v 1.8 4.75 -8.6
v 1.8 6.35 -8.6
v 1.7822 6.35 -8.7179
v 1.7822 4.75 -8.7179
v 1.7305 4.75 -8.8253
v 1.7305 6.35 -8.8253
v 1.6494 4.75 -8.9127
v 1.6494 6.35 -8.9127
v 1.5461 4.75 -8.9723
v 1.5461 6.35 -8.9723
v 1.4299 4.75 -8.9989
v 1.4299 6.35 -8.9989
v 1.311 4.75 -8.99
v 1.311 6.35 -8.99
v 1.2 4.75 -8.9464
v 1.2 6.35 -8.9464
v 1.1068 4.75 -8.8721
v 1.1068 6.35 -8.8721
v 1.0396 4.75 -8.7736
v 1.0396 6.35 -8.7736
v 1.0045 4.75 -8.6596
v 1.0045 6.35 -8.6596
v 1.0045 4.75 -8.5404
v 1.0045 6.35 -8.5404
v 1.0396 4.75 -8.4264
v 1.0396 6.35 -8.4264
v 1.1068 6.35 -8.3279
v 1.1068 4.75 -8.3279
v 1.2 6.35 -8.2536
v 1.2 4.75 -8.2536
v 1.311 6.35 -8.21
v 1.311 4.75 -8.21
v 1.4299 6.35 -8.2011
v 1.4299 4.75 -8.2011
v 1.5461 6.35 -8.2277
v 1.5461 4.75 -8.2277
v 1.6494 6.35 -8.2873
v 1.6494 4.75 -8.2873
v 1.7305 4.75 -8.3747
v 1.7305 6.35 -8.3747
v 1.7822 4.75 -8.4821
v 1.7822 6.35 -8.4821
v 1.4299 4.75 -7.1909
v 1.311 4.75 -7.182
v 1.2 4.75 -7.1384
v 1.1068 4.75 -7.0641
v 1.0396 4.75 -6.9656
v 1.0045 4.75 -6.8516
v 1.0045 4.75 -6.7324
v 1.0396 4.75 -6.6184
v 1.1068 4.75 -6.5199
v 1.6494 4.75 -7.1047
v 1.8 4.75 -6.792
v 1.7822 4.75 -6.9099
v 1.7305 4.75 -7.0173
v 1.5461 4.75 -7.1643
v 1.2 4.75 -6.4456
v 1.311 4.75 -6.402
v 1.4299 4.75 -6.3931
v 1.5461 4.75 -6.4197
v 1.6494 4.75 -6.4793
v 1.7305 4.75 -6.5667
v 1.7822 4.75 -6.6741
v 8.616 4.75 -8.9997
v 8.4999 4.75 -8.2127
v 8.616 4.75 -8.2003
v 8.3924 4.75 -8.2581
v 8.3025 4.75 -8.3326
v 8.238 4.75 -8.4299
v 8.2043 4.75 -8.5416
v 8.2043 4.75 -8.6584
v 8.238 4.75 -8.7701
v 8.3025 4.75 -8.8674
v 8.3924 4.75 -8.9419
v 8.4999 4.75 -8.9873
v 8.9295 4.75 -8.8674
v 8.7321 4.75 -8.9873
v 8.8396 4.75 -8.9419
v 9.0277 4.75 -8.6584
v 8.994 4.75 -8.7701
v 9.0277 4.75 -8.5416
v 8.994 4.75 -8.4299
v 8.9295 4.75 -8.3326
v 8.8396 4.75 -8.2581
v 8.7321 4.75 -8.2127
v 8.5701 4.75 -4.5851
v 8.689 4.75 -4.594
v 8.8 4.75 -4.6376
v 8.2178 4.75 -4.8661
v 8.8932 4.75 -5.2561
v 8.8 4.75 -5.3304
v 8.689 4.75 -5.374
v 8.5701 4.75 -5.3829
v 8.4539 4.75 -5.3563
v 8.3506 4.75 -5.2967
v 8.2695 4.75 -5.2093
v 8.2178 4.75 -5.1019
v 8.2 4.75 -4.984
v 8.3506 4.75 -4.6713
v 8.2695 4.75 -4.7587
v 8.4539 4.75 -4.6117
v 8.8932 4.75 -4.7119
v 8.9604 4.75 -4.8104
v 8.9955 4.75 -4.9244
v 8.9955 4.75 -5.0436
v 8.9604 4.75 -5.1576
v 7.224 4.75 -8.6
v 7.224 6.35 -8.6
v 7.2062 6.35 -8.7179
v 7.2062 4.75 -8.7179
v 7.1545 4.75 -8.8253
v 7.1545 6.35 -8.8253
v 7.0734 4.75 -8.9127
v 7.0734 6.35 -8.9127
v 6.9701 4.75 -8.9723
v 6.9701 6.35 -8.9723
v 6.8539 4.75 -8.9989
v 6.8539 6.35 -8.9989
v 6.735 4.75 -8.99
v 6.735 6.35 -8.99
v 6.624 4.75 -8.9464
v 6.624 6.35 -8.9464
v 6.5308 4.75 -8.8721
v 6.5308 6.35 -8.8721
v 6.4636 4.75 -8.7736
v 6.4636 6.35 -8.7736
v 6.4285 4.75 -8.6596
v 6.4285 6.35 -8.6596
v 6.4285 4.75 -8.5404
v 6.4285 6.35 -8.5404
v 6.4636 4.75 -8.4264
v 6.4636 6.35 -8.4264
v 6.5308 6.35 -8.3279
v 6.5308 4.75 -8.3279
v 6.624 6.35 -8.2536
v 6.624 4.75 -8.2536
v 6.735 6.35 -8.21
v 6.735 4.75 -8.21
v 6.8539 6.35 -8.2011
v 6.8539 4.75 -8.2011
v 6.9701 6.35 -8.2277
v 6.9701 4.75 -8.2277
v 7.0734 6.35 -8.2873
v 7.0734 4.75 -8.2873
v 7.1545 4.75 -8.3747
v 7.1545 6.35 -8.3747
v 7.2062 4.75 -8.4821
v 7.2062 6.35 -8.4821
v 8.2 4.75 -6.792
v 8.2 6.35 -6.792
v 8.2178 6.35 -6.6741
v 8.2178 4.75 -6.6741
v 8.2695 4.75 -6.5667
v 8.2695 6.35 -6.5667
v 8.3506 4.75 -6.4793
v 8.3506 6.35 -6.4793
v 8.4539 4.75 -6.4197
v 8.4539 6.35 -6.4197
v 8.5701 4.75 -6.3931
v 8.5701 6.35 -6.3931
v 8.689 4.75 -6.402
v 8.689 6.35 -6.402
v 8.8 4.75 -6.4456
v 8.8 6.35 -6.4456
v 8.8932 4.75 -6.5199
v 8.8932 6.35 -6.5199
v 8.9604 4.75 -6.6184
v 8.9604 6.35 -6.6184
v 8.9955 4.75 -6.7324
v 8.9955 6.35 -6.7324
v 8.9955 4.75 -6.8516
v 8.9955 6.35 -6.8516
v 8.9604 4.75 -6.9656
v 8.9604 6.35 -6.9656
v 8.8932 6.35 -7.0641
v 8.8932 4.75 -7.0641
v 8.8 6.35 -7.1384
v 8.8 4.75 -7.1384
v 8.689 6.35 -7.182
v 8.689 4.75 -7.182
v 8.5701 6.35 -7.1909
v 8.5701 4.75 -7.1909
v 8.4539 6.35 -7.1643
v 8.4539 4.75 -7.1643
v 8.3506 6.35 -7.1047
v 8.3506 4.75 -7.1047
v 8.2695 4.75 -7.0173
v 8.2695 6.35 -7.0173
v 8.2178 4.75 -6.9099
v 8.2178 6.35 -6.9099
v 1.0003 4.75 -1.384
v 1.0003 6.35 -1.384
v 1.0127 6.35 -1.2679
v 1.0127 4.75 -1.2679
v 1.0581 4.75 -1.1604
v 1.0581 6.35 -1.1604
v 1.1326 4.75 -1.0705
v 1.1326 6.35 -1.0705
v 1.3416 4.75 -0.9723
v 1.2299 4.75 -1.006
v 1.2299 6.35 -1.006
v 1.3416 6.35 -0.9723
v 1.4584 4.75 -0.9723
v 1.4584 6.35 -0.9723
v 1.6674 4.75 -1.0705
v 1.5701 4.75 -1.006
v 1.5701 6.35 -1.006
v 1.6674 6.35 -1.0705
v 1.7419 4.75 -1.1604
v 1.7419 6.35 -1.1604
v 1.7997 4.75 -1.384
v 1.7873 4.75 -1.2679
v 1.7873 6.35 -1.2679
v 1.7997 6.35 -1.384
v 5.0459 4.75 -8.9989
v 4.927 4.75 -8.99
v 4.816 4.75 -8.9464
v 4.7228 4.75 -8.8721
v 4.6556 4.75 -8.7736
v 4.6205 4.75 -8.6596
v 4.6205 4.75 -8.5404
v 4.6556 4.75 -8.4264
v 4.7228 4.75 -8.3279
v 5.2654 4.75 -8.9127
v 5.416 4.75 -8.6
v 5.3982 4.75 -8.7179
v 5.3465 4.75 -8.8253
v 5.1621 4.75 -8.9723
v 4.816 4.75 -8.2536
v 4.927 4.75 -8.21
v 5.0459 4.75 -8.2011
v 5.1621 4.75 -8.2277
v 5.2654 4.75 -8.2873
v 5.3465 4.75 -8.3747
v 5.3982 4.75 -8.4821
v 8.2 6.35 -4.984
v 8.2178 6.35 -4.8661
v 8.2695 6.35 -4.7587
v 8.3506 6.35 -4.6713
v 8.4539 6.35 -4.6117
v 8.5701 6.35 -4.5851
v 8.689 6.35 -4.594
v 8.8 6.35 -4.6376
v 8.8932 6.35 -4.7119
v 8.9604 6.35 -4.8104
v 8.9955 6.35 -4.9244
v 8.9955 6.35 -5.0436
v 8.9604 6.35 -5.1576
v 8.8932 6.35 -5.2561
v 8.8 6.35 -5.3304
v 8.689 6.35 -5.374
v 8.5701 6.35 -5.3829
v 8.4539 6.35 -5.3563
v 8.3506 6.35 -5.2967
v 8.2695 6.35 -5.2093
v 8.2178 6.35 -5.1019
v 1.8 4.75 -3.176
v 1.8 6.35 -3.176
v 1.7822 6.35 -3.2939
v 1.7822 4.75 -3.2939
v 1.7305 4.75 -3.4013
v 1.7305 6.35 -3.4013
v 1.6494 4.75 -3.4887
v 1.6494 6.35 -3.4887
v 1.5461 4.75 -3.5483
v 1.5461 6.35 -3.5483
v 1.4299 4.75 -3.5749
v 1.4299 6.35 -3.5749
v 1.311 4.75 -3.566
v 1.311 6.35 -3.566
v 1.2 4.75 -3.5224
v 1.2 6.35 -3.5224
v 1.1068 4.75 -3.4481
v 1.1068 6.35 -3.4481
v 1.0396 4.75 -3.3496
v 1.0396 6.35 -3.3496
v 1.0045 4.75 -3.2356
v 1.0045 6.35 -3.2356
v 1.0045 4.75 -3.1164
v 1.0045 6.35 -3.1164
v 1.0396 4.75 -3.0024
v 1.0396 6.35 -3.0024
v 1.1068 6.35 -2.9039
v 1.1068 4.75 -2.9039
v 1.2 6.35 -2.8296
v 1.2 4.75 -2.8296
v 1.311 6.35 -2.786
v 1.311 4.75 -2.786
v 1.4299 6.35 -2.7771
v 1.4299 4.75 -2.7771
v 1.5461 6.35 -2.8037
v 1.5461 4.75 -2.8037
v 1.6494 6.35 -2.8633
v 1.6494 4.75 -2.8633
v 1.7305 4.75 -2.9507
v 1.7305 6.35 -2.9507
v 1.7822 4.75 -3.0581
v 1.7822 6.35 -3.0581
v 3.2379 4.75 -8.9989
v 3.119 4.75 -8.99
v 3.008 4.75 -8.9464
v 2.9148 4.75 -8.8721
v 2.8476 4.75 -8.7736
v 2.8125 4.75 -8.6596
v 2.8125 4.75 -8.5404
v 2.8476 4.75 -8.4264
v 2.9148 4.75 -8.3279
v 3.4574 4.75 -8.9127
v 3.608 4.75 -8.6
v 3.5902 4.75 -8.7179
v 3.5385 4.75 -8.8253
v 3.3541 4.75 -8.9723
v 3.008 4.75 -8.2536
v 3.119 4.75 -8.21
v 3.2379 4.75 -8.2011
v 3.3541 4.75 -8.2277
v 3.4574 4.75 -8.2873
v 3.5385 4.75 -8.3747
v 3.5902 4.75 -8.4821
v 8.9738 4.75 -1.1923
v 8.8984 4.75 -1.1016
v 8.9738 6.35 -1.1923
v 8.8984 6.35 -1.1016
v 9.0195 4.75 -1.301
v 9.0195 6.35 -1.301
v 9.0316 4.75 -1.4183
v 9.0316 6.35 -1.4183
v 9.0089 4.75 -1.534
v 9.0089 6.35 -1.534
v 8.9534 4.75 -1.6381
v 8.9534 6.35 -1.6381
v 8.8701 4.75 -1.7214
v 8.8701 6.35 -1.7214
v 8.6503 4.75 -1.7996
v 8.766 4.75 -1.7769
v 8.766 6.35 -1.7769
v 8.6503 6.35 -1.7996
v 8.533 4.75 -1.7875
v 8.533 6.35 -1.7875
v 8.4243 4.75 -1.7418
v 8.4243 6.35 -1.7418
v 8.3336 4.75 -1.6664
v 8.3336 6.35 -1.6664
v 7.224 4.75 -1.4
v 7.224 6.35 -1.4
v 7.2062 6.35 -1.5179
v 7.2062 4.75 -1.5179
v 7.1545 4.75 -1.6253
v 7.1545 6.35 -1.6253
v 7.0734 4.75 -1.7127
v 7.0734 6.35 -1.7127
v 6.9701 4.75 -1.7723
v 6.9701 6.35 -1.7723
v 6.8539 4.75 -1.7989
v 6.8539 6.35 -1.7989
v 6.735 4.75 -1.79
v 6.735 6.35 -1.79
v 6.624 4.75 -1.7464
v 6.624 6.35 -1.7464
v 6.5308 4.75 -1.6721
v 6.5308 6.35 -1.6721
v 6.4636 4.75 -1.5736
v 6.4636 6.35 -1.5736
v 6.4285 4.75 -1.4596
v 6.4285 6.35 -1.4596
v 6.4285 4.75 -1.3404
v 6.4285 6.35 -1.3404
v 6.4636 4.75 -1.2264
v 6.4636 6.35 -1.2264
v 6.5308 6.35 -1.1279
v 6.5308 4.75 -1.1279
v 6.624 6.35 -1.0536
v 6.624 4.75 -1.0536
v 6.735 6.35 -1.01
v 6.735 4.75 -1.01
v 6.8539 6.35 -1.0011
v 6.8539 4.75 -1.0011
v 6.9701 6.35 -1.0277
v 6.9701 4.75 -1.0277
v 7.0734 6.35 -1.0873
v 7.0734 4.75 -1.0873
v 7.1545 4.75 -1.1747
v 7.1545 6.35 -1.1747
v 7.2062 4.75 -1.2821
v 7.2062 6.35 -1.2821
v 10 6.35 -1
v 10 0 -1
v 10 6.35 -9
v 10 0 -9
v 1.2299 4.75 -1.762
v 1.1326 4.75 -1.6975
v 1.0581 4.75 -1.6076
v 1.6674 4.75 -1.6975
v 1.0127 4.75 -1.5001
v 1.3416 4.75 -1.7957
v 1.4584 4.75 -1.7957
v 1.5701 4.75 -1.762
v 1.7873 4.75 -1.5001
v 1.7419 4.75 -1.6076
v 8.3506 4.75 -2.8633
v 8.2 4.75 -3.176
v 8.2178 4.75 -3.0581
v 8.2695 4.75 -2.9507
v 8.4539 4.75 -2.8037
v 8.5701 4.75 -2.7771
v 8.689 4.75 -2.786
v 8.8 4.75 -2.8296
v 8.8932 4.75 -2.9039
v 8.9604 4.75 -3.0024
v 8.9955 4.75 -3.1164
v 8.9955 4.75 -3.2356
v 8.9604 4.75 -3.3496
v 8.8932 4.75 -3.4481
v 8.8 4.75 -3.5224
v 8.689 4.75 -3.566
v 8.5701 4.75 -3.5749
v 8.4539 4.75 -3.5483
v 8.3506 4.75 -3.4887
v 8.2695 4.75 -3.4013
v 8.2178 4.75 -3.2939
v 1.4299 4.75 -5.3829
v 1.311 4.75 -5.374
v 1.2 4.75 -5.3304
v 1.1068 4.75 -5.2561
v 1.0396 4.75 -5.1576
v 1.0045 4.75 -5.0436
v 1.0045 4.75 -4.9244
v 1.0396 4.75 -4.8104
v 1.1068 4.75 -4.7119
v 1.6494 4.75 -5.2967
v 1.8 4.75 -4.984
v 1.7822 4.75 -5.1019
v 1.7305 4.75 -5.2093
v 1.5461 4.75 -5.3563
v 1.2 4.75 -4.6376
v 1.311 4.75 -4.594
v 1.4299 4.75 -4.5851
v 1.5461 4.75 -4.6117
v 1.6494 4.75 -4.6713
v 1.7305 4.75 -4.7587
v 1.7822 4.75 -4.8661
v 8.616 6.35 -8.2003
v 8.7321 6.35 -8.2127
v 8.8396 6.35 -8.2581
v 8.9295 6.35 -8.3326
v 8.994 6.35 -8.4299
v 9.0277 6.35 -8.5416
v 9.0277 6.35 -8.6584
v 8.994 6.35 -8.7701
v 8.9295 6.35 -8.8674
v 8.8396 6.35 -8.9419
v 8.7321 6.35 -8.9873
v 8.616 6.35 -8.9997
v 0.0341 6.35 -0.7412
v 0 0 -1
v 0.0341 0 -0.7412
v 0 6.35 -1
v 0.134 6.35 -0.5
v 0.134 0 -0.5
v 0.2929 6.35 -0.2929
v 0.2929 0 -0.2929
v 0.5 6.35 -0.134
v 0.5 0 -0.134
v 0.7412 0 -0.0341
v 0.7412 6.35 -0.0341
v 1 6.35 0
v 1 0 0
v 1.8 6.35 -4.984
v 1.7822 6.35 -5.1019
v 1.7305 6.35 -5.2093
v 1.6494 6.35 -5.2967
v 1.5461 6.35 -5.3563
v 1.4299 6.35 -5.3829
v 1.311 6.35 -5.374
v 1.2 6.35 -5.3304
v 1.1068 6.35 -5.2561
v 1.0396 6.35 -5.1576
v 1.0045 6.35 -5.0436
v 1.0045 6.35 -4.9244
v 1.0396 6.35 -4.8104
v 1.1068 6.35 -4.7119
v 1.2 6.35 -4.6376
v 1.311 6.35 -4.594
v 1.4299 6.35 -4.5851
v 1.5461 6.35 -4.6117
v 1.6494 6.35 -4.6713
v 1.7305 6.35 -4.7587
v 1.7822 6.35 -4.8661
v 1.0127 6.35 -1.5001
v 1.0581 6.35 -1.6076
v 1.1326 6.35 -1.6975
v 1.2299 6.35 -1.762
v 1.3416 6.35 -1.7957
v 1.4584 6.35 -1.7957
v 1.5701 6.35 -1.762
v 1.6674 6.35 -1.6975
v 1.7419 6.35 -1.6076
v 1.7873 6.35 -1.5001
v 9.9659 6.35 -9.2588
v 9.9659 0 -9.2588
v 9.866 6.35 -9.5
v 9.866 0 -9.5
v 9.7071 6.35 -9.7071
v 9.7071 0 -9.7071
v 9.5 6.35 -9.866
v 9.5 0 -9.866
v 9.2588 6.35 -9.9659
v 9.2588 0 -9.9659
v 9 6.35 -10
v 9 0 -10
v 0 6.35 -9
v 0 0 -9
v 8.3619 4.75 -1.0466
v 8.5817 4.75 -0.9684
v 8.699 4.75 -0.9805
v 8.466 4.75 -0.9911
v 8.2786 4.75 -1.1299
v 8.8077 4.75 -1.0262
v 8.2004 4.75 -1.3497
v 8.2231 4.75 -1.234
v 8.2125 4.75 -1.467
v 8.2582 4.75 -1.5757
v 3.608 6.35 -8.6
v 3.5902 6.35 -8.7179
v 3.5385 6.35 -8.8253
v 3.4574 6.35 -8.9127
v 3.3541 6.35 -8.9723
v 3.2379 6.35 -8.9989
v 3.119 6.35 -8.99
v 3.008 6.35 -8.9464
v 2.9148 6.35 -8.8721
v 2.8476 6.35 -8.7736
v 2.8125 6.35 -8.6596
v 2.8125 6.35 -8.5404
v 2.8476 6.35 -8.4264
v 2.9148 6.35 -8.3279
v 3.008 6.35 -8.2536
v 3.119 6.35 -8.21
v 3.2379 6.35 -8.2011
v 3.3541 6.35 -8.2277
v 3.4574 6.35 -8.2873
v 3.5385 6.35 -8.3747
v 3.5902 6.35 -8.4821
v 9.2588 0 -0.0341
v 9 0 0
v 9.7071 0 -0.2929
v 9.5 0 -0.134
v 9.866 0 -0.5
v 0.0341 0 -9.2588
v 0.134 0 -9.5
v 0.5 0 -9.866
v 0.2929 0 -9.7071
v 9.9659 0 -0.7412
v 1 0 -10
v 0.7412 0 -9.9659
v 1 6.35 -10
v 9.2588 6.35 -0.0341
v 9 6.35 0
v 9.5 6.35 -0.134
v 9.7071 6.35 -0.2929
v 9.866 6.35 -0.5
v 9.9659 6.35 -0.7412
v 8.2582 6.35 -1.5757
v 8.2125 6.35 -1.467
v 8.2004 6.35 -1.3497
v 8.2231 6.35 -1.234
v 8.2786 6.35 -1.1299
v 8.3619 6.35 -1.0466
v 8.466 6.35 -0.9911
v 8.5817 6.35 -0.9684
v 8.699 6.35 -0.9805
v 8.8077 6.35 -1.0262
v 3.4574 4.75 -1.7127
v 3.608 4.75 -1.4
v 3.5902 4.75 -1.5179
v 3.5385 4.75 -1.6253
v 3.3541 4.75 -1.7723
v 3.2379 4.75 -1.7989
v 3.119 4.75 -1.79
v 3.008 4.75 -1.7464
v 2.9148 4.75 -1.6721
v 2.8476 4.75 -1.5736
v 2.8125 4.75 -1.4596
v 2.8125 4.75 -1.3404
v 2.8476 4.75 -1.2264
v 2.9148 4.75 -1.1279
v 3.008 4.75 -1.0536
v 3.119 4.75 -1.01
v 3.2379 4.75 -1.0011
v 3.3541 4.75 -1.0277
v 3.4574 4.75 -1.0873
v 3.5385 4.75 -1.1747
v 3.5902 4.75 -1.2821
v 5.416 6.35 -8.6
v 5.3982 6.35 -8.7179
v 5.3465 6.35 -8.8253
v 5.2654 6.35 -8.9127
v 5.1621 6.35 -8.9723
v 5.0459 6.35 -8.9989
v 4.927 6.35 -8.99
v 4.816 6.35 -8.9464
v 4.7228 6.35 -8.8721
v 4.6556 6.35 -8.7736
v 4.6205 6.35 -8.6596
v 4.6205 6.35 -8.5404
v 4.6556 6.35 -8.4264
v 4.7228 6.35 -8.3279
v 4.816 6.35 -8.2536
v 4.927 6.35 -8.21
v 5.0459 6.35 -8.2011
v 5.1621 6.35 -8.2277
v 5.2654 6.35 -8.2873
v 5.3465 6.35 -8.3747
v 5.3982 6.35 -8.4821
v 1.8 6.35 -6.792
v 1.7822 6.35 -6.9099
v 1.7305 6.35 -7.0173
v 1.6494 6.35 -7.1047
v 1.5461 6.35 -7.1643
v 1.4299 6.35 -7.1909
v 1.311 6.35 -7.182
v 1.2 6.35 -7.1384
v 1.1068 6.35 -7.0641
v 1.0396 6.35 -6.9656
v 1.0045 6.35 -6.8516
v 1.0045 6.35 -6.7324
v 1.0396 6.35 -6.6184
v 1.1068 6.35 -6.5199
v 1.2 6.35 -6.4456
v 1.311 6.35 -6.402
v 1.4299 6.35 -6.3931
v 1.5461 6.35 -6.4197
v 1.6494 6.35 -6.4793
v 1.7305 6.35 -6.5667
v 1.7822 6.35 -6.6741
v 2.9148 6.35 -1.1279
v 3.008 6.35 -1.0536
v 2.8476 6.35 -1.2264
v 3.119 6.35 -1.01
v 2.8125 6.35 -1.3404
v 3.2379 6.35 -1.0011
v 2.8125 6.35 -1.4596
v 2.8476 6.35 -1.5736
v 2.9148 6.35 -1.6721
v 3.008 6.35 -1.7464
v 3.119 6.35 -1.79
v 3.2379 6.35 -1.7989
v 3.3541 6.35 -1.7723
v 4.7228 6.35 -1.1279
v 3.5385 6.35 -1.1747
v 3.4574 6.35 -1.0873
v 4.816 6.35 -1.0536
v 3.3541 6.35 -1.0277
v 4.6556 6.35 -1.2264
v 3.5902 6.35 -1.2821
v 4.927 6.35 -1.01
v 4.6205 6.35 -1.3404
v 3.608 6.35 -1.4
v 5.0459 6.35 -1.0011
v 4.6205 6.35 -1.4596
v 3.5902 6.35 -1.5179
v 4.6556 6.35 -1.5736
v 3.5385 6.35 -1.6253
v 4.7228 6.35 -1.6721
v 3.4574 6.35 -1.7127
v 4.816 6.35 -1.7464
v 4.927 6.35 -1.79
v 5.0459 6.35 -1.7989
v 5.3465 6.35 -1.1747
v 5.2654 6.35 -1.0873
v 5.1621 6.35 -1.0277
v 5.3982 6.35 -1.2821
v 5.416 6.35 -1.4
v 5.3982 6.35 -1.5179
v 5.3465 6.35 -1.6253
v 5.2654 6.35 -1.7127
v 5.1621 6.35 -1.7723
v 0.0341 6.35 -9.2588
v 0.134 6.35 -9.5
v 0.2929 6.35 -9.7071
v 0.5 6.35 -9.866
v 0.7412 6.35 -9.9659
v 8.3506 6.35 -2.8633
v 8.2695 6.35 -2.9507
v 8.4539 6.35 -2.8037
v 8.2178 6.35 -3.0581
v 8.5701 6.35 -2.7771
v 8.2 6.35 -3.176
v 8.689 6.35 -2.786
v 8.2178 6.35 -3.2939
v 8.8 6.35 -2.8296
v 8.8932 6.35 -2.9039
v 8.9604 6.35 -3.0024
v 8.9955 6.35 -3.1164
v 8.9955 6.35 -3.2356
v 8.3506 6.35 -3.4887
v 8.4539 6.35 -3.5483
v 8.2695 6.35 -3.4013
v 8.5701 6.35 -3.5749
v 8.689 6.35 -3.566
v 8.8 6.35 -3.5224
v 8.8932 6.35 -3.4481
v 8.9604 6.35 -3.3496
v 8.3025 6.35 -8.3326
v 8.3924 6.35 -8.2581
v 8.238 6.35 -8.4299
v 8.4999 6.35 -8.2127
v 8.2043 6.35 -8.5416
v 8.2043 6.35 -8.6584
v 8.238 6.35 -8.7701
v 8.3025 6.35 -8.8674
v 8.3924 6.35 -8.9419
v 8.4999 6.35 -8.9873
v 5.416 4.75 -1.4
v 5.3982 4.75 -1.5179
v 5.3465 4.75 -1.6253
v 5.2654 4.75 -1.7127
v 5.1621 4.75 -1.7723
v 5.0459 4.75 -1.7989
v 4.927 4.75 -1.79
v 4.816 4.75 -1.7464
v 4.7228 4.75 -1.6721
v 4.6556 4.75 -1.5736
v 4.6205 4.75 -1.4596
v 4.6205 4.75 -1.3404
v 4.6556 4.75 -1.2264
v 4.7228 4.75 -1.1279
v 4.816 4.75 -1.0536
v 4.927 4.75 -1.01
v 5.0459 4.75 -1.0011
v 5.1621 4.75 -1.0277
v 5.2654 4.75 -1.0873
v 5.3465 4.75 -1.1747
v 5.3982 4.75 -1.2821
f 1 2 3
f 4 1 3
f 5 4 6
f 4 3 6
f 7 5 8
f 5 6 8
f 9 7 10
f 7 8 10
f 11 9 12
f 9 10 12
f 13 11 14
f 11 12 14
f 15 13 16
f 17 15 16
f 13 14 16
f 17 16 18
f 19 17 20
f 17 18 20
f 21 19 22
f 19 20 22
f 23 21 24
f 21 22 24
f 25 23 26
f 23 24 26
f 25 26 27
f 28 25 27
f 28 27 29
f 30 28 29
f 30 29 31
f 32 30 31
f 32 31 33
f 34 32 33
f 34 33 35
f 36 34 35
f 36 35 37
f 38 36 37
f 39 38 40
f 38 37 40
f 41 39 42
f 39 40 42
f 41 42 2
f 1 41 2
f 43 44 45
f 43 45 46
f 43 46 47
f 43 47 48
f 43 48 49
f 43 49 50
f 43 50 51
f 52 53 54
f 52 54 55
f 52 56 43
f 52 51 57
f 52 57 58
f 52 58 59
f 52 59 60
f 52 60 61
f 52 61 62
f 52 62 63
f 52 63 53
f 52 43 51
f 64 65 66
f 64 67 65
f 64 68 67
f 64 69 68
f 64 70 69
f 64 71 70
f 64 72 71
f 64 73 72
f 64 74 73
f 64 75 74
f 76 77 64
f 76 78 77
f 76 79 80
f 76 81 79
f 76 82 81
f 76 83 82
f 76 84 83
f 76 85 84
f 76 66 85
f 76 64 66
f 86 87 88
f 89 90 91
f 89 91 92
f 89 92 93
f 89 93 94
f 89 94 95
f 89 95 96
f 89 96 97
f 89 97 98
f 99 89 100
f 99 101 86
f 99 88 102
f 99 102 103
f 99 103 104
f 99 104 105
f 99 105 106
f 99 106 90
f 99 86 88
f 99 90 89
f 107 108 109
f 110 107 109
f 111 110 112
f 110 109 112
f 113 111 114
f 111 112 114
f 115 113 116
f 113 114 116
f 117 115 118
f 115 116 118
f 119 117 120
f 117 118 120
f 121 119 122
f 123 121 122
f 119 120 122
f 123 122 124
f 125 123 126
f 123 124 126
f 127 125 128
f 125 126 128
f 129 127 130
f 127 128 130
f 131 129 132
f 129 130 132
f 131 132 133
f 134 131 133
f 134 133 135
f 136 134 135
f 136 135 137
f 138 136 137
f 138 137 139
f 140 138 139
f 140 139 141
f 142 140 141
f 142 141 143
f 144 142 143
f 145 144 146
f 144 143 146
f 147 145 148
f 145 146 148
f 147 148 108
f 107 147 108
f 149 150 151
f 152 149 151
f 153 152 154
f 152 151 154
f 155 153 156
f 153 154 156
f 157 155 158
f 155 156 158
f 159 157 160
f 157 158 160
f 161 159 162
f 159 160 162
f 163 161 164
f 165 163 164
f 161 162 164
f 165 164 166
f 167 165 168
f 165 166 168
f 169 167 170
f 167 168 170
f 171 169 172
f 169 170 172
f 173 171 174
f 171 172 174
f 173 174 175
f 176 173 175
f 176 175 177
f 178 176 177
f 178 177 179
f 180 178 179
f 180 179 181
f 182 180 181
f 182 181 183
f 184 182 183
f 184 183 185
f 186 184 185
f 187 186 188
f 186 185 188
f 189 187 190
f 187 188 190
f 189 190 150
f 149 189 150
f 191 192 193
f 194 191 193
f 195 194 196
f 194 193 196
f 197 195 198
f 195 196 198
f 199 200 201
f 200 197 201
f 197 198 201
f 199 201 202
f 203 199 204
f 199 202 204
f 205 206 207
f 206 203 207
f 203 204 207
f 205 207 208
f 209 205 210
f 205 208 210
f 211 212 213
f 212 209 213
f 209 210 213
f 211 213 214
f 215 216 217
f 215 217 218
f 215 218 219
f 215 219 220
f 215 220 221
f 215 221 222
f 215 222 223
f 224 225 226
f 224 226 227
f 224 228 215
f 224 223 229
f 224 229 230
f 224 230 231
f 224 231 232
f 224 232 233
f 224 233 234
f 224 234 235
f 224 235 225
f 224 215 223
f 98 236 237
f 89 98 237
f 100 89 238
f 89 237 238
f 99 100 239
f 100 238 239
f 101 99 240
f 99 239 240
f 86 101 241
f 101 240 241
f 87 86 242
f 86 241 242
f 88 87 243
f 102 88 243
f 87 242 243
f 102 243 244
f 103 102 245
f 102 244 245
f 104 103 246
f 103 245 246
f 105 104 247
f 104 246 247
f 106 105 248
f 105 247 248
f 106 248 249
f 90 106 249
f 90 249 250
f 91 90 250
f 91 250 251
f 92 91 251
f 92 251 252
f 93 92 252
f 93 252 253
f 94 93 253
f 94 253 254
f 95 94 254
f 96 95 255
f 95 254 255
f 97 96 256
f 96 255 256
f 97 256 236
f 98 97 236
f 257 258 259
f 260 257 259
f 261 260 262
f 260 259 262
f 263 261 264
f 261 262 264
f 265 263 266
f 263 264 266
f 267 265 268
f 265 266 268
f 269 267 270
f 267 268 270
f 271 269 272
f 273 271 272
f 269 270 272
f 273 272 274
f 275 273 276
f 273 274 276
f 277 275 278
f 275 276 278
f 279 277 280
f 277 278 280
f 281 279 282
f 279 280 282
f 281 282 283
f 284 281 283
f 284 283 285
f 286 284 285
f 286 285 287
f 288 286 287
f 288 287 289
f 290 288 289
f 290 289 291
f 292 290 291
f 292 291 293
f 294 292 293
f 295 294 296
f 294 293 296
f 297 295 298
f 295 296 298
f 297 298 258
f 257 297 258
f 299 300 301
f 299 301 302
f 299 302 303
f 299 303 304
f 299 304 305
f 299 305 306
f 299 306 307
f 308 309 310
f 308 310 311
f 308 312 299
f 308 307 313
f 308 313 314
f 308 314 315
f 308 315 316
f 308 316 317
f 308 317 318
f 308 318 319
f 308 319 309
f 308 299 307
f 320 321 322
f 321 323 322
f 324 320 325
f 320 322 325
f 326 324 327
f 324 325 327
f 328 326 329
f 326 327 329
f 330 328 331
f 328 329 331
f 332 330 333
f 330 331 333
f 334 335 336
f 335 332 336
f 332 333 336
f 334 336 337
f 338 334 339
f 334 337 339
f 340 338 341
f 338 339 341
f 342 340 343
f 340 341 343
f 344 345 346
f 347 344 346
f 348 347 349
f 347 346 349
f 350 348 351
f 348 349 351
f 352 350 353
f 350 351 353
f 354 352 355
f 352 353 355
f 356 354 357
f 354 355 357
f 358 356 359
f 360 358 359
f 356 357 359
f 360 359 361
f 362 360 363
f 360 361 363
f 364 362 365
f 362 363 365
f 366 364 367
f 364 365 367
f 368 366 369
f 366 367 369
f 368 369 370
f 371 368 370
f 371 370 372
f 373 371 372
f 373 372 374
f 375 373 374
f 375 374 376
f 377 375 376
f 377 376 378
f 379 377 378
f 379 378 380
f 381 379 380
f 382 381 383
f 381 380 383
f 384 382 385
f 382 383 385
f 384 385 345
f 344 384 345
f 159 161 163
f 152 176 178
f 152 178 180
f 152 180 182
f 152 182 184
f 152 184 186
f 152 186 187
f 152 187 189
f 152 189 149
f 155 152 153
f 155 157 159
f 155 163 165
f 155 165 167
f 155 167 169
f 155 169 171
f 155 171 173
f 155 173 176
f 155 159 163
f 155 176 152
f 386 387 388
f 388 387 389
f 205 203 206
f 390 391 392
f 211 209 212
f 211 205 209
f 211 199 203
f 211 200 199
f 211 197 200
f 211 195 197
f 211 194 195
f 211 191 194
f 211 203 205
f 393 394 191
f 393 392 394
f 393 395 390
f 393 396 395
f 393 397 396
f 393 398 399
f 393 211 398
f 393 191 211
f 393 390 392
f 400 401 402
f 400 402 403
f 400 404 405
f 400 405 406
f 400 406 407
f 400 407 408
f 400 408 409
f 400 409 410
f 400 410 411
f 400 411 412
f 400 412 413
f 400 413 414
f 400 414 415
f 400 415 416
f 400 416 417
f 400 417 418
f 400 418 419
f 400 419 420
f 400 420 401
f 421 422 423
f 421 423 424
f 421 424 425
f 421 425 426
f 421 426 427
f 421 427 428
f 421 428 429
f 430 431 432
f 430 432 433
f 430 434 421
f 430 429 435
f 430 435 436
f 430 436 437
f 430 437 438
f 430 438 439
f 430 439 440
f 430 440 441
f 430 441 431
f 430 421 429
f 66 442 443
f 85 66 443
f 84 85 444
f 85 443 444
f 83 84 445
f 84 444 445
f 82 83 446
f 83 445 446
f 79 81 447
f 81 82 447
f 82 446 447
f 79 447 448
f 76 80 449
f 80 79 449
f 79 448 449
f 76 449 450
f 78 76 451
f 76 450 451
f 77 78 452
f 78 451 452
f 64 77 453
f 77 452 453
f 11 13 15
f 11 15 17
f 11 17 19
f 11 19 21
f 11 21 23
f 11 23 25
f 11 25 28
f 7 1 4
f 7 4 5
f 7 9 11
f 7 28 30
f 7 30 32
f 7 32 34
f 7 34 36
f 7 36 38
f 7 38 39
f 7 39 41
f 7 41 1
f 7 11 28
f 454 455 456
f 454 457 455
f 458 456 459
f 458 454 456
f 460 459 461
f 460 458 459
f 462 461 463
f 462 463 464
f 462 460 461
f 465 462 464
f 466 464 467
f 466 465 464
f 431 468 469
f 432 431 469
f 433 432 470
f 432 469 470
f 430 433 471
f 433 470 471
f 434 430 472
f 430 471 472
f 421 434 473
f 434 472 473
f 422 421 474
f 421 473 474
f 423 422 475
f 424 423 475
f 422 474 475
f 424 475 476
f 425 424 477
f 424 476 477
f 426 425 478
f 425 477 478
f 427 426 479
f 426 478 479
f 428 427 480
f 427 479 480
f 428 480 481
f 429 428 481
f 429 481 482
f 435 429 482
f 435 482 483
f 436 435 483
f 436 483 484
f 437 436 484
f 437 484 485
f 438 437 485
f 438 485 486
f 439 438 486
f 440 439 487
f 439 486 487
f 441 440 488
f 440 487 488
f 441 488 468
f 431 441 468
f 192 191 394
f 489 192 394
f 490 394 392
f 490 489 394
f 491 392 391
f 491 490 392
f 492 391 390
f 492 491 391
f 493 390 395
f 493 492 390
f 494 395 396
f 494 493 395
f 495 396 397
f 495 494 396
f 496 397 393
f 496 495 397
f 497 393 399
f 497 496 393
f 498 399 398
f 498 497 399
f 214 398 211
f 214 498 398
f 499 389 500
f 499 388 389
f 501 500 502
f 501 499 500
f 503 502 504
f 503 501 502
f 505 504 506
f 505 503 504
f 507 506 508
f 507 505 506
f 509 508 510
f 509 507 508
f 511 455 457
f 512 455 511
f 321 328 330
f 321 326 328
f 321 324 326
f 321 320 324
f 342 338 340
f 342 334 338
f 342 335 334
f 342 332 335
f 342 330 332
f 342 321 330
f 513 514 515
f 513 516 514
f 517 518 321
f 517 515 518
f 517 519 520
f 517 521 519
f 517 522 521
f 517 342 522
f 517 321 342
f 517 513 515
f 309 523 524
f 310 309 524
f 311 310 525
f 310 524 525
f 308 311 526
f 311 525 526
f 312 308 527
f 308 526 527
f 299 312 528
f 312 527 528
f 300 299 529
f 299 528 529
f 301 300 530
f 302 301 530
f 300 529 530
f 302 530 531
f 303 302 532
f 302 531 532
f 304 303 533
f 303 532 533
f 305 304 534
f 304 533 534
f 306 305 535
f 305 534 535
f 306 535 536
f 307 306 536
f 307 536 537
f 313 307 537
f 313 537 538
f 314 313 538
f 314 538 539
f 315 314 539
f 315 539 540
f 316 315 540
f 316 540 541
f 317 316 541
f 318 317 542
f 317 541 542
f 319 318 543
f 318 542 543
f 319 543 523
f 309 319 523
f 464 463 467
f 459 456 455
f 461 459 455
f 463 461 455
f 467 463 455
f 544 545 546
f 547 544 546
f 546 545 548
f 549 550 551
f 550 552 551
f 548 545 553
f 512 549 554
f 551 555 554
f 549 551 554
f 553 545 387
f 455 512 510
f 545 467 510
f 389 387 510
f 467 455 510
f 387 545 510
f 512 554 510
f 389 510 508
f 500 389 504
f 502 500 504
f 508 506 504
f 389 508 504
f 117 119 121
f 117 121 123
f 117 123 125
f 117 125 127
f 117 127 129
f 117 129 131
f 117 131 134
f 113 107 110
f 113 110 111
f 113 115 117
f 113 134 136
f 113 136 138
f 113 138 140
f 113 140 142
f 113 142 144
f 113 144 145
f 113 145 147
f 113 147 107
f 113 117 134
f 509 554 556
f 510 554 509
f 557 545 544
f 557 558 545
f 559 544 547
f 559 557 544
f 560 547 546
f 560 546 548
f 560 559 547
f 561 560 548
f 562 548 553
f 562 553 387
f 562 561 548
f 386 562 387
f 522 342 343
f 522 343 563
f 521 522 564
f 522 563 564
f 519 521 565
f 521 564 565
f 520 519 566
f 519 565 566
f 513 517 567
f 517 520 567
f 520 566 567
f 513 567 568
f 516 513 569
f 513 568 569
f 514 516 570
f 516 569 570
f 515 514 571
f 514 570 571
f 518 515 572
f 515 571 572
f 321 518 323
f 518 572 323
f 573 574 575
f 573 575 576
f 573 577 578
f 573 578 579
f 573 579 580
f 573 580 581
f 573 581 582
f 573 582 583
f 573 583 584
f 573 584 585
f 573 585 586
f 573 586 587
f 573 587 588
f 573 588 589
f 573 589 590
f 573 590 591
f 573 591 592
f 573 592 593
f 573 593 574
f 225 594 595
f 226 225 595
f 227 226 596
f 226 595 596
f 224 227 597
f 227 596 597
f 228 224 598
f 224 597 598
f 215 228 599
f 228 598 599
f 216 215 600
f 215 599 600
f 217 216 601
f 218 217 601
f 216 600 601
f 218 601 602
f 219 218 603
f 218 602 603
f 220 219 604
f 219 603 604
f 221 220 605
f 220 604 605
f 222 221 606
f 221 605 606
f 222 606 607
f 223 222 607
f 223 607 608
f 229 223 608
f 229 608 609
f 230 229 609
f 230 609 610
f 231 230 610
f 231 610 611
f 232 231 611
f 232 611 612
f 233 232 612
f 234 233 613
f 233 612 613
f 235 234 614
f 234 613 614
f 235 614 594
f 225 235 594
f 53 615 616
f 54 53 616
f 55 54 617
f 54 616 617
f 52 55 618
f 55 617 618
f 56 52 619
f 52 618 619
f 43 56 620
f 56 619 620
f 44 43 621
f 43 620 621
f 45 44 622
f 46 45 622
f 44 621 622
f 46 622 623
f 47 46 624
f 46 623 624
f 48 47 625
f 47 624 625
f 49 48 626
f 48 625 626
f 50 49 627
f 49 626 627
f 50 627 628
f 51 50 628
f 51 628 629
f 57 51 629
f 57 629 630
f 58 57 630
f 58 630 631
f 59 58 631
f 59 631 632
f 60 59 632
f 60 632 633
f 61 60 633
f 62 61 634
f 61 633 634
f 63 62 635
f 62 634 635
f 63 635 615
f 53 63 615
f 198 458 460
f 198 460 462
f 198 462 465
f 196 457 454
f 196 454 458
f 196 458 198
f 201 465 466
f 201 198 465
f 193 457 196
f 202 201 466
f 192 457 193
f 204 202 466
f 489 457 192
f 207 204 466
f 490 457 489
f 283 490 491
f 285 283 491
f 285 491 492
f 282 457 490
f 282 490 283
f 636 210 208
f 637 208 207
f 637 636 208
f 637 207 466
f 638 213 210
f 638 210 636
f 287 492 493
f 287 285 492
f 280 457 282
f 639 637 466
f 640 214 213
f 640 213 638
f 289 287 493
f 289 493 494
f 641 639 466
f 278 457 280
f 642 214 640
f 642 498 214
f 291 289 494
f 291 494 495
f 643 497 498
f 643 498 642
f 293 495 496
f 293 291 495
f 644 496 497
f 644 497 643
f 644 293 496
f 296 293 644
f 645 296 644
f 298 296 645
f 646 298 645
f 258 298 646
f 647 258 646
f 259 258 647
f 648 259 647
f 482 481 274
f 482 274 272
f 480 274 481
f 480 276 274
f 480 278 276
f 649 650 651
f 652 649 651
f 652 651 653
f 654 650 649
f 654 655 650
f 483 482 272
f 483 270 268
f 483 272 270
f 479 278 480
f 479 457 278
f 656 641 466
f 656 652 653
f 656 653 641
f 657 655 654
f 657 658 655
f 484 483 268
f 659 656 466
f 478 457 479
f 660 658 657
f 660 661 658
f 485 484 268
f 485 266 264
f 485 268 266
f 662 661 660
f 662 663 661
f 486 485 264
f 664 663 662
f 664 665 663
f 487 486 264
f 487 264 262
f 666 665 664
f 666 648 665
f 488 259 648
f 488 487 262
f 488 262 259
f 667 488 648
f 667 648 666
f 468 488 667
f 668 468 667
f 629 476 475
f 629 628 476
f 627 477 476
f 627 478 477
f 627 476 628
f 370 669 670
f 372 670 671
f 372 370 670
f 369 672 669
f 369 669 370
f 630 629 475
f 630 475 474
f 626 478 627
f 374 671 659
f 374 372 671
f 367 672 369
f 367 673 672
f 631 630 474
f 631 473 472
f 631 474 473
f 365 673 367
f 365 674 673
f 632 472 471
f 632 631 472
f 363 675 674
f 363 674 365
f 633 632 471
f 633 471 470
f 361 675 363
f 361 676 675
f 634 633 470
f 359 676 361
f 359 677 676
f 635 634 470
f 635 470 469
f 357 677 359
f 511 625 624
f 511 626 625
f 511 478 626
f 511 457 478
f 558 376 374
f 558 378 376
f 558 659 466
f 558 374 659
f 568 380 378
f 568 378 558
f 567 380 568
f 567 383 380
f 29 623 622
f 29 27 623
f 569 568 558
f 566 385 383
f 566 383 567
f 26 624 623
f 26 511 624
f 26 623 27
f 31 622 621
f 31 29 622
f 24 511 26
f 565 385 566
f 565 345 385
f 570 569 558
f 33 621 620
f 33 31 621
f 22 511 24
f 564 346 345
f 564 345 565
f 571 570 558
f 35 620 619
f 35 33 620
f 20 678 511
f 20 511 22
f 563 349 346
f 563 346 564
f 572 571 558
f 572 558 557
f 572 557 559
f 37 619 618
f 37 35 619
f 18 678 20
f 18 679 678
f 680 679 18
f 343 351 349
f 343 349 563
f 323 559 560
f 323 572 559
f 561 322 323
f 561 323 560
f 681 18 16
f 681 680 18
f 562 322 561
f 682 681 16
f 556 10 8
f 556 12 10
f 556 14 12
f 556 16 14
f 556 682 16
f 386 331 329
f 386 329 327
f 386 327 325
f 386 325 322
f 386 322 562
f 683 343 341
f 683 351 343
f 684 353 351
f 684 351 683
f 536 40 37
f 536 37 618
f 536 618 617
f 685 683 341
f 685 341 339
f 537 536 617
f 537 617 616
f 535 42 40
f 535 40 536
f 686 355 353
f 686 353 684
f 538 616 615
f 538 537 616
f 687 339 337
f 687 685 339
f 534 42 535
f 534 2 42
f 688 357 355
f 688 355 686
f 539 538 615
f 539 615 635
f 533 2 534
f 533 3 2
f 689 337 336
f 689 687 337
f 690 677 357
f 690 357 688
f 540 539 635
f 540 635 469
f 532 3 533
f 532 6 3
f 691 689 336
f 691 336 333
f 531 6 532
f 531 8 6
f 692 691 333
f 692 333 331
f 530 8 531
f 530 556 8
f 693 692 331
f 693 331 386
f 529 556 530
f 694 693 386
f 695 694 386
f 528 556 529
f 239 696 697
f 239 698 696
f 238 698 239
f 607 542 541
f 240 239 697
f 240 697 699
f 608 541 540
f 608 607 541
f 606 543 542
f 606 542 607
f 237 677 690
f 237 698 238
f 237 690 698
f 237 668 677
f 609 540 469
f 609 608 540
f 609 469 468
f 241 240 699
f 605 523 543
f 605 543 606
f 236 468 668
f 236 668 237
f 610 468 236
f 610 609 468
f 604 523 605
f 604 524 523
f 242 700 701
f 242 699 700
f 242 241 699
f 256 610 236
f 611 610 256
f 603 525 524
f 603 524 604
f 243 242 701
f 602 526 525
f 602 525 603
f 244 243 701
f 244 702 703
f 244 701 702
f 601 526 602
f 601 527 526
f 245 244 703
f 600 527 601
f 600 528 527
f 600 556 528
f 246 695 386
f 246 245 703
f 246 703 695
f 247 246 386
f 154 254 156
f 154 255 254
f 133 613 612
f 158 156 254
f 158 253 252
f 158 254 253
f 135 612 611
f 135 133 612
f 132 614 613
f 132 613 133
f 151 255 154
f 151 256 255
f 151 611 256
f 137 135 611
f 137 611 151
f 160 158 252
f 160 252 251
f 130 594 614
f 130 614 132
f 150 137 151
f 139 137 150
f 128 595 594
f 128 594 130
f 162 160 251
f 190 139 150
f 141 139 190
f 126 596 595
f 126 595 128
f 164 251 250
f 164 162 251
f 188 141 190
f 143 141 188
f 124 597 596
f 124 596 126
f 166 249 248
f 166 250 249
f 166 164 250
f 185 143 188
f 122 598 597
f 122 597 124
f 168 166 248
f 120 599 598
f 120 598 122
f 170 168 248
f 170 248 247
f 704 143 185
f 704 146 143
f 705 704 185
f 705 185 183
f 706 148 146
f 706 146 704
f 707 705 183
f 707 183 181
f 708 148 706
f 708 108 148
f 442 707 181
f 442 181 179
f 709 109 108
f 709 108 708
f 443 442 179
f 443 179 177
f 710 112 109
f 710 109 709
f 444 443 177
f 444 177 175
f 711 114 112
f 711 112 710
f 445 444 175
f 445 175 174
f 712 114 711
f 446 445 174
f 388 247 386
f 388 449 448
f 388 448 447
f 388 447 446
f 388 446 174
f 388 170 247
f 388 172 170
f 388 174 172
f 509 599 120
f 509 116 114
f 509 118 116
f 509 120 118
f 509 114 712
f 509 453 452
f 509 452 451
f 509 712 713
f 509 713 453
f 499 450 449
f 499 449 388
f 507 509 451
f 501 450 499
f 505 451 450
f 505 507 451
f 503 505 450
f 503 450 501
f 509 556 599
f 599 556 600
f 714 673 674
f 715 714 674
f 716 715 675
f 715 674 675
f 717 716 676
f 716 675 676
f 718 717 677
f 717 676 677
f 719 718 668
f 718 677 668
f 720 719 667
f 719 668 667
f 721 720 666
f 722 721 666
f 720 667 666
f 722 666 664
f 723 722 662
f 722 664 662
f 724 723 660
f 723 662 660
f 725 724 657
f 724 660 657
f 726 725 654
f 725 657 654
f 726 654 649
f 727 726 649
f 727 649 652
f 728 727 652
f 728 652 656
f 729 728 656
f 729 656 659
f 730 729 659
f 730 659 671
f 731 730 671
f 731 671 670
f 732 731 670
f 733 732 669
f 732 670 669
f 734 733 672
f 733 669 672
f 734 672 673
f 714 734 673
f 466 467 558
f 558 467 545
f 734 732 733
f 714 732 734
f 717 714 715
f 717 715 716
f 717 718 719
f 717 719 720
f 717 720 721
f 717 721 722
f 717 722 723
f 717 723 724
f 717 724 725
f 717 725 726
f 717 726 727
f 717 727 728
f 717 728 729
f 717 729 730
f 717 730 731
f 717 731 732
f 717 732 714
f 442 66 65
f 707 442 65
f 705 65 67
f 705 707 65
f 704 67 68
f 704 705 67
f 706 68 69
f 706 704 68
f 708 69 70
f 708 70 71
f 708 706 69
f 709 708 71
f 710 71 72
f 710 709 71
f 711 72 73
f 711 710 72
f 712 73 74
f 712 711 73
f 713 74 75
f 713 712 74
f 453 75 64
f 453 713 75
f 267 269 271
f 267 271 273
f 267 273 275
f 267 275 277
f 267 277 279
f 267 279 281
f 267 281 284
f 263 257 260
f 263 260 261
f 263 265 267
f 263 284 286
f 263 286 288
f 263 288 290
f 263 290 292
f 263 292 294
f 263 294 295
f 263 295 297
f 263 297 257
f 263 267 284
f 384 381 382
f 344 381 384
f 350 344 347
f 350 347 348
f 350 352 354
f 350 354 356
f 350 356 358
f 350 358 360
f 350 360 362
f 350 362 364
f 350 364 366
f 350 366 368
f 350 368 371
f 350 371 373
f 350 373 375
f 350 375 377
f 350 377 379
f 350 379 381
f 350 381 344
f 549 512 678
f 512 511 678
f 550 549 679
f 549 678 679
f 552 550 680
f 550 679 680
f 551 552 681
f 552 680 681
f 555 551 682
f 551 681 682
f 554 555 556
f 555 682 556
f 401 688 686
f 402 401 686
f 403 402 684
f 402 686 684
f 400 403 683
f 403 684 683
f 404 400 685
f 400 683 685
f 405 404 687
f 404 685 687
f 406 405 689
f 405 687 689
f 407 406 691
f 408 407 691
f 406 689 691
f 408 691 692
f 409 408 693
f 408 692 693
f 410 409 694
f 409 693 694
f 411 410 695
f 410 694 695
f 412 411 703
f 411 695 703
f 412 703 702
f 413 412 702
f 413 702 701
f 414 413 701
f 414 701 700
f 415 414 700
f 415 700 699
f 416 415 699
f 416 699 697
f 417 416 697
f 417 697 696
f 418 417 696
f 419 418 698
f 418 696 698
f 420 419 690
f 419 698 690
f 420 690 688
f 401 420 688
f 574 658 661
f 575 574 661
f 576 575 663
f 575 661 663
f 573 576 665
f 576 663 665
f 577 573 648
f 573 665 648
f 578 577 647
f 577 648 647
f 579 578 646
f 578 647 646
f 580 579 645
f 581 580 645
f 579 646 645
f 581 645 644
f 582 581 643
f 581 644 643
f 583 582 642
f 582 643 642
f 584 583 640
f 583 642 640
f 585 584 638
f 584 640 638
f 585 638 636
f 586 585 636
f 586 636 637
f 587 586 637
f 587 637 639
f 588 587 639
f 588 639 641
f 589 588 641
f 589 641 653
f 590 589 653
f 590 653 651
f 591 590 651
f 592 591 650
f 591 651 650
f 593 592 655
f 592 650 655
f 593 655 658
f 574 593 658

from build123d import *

# Parameters (mm, degrees)
SKETCH1_W               = 10
SKETCH1_H               = 10
BOSS_EXTRUDE1_DEPTH     = 6.35
FILLET1_R               = 1
SKETCH2_R               = 0.4
CUT_EXTRUDE1_DEPTH      = 1.6
LPATTERN1_COUNT         = 5
LPATTERN1_PITCH         = 1.808
LPATTERN2_COUNT         = 5
LPATTERN2_PITCH         = 1.808
MIRROR2_COPY_1_SKETCH_R = 0.4
MIRROR2_COPY_1_DEPTH    = 1.6
MIRROR2_COPY_2_SKETCH_R = 0.4
MIRROR2_COPY_2_DEPTH    = 1.6
MIRROR2_COPY_3_SKETCH_R = 0.4
MIRROR2_COPY_3_DEPTH    = 1.6
MIRROR2_COPY_4_SKETCH_R = 0.4
MIRROR2_COPY_4_DEPTH    = 1.6
MIRROR3_COPY_1_SKETCH_R = 0.4
MIRROR3_COPY_1_DEPTH    = 1.6
MIRROR3_COPY_2_SKETCH_R = 0.4
MIRROR3_COPY_2_DEPTH    = 1.6
MIRROR3_COPY_3_SKETCH_R = 0.4
MIRROR3_COPY_3_DEPTH    = 1.6
MIRROR3_COPY_4_SKETCH_R = 0.4
MIRROR3_COPY_4_DEPTH    = 1.6


with BuildPart() as part:
    # Sketch1 → Boss-Extrude1 (new body)
    with BuildSketch(Plane(origin=(0, 0, 0), x_dir=(1, 0, 0), z_dir=(0, 1, 0))):
        with Locations((5, 5)):
            Rectangle(SKETCH1_W, SKETCH1_H)
    extrude(amount=BOSS_EXTRUDE1_DEPTH)

    # Fillet1
    fillet1_edges = [part.edges().sort_by_distance(p)[0] for p in [
        (0, 3.175, -10),
        (10, 3.175, -10),
        (10, 3.175, 0),
        (0, 3.175, 0),
    ]]
    fillet(fillet1_edges, radius=FILLET1_R)

    # Sketch2 → Cut-Extrude1 (cut)
    with BuildSketch(Plane(origin=(0, 6.35, 0), x_dir=(1, 0, 0), z_dir=(0, 1, 0))):
        with Locations((1.4, 8.6)):
            Circle(SKETCH2_R)
    cut_extrude1 = extrude(amount=-CUT_EXTRUDE1_DEPTH, mode=Mode.SUBTRACT)

    # LPattern1: Cut-Extrude1 ×5
    with Locations(*[(i * LPATTERN1_PITCH, 0, 0) for i in range(1, LPATTERN1_COUNT)]):
        add(cut_extrude1, mode=Mode.SUBTRACT)

    # LPattern2: Cut-Extrude1 ×5
    with Locations(*[(0, 0, i * LPATTERN2_PITCH) for i in range(1, LPATTERN2_COUNT)]):
        add(cut_extrude1, mode=Mode.SUBTRACT)

    # Mirror2: Cut-Extrude1 across plane
    add(cut_extrude1.mirror(Plane.ZY.offset(-5)), mode=Mode.SUBTRACT)

    # Mirror2 copy 1 sketch → Mirror2 copy 1 (cut)
    with BuildSketch(Plane(origin=(10, 6.35, 1.808), x_dir=(-1, 0, 0), z_dir=(0, 1, 0))):
        with Locations((1.4, -8.6)):
            Circle(MIRROR2_COPY_1_SKETCH_R)
    extrude(amount=-MIRROR2_COPY_1_DEPTH, mode=Mode.SUBTRACT)

    # Mirror2 copy 2 sketch → Mirror2 copy 2 (cut)
    with BuildSketch(Plane(origin=(10, 6.35, 3.616), x_dir=(-1, 0, 0), z_dir=(0, 1, 0))):
        with Locations((1.4, -8.6)):
            Circle(MIRROR2_COPY_2_SKETCH_R)
    extrude(amount=-MIRROR2_COPY_2_DEPTH, mode=Mode.SUBTRACT)

    # Mirror2 copy 3 sketch → Mirror2 copy 3 (cut)
    with BuildSketch(Plane(origin=(10, 6.35, 5.424), x_dir=(-1, 0, 0), z_dir=(0, 1, 0))):
        with Locations((1.4, -8.6)):
            Circle(MIRROR2_COPY_3_SKETCH_R)
    extrude(amount=-MIRROR2_COPY_3_DEPTH, mode=Mode.SUBTRACT)

    # Mirror2 copy 4 sketch → Mirror2 copy 4 (cut)
    with BuildSketch(Plane(origin=(10, 6.35, 7.232), x_dir=(-1, 0, 0), z_dir=(0, 1, 0))):
        with Locations((1.4, -8.6)):
            Circle(MIRROR2_COPY_4_SKETCH_R)
    extrude(amount=-MIRROR2_COPY_4_DEPTH, mode=Mode.SUBTRACT)

    # Mirror3: Cut-Extrude1 across plane
    add(cut_extrude1.mirror(Plane(origin=(0, 0, -5), x_dir=(1, 0, 0), z_dir=(0, 0, -1))), mode=Mode.SUBTRACT)

    # Mirror3 copy 1 sketch → Mirror3 copy 1 (cut)
    with BuildSketch(Plane(origin=(1.808, 6.35, -10), x_dir=(1, 0, 0), z_dir=(0, 1, 0))):
        with Locations((1.4, -8.6)):
            Circle(MIRROR3_COPY_1_SKETCH_R)
    extrude(amount=-MIRROR3_COPY_1_DEPTH, mode=Mode.SUBTRACT)

    # Mirror3 copy 2 sketch → Mirror3 copy 2 (cut)
    with BuildSketch(Plane(origin=(3.616, 6.35, -10), x_dir=(1, 0, 0), z_dir=(0, 1, 0))):
        with Locations((1.4, -8.6)):
            Circle(MIRROR3_COPY_2_SKETCH_R)
    extrude(amount=-MIRROR3_COPY_2_DEPTH, mode=Mode.SUBTRACT)

    # Mirror3 copy 3 sketch → Mirror3 copy 3 (cut)
    with BuildSketch(Plane(origin=(5.424, 6.35, -10), x_dir=(1, 0, 0), z_dir=(0, 1, 0))):
        with Locations((1.4, -8.6)):
            Circle(MIRROR3_COPY_3_SKETCH_R)
    extrude(amount=-MIRROR3_COPY_3_DEPTH, mode=Mode.SUBTRACT)

    # Mirror3 copy 4 sketch → Mirror3 copy 4 (cut)
    with BuildSketch(Plane(origin=(7.232, 6.35, -10), x_dir=(1, 0, 0), z_dir=(0, 1, 0))):
        with Locations((1.4, -8.6)):
            Circle(MIRROR3_COPY_4_SKETCH_R)
    extrude(amount=-MIRROR3_COPY_4_DEPTH, mode=Mode.SUBTRACT)


solid = part.part
